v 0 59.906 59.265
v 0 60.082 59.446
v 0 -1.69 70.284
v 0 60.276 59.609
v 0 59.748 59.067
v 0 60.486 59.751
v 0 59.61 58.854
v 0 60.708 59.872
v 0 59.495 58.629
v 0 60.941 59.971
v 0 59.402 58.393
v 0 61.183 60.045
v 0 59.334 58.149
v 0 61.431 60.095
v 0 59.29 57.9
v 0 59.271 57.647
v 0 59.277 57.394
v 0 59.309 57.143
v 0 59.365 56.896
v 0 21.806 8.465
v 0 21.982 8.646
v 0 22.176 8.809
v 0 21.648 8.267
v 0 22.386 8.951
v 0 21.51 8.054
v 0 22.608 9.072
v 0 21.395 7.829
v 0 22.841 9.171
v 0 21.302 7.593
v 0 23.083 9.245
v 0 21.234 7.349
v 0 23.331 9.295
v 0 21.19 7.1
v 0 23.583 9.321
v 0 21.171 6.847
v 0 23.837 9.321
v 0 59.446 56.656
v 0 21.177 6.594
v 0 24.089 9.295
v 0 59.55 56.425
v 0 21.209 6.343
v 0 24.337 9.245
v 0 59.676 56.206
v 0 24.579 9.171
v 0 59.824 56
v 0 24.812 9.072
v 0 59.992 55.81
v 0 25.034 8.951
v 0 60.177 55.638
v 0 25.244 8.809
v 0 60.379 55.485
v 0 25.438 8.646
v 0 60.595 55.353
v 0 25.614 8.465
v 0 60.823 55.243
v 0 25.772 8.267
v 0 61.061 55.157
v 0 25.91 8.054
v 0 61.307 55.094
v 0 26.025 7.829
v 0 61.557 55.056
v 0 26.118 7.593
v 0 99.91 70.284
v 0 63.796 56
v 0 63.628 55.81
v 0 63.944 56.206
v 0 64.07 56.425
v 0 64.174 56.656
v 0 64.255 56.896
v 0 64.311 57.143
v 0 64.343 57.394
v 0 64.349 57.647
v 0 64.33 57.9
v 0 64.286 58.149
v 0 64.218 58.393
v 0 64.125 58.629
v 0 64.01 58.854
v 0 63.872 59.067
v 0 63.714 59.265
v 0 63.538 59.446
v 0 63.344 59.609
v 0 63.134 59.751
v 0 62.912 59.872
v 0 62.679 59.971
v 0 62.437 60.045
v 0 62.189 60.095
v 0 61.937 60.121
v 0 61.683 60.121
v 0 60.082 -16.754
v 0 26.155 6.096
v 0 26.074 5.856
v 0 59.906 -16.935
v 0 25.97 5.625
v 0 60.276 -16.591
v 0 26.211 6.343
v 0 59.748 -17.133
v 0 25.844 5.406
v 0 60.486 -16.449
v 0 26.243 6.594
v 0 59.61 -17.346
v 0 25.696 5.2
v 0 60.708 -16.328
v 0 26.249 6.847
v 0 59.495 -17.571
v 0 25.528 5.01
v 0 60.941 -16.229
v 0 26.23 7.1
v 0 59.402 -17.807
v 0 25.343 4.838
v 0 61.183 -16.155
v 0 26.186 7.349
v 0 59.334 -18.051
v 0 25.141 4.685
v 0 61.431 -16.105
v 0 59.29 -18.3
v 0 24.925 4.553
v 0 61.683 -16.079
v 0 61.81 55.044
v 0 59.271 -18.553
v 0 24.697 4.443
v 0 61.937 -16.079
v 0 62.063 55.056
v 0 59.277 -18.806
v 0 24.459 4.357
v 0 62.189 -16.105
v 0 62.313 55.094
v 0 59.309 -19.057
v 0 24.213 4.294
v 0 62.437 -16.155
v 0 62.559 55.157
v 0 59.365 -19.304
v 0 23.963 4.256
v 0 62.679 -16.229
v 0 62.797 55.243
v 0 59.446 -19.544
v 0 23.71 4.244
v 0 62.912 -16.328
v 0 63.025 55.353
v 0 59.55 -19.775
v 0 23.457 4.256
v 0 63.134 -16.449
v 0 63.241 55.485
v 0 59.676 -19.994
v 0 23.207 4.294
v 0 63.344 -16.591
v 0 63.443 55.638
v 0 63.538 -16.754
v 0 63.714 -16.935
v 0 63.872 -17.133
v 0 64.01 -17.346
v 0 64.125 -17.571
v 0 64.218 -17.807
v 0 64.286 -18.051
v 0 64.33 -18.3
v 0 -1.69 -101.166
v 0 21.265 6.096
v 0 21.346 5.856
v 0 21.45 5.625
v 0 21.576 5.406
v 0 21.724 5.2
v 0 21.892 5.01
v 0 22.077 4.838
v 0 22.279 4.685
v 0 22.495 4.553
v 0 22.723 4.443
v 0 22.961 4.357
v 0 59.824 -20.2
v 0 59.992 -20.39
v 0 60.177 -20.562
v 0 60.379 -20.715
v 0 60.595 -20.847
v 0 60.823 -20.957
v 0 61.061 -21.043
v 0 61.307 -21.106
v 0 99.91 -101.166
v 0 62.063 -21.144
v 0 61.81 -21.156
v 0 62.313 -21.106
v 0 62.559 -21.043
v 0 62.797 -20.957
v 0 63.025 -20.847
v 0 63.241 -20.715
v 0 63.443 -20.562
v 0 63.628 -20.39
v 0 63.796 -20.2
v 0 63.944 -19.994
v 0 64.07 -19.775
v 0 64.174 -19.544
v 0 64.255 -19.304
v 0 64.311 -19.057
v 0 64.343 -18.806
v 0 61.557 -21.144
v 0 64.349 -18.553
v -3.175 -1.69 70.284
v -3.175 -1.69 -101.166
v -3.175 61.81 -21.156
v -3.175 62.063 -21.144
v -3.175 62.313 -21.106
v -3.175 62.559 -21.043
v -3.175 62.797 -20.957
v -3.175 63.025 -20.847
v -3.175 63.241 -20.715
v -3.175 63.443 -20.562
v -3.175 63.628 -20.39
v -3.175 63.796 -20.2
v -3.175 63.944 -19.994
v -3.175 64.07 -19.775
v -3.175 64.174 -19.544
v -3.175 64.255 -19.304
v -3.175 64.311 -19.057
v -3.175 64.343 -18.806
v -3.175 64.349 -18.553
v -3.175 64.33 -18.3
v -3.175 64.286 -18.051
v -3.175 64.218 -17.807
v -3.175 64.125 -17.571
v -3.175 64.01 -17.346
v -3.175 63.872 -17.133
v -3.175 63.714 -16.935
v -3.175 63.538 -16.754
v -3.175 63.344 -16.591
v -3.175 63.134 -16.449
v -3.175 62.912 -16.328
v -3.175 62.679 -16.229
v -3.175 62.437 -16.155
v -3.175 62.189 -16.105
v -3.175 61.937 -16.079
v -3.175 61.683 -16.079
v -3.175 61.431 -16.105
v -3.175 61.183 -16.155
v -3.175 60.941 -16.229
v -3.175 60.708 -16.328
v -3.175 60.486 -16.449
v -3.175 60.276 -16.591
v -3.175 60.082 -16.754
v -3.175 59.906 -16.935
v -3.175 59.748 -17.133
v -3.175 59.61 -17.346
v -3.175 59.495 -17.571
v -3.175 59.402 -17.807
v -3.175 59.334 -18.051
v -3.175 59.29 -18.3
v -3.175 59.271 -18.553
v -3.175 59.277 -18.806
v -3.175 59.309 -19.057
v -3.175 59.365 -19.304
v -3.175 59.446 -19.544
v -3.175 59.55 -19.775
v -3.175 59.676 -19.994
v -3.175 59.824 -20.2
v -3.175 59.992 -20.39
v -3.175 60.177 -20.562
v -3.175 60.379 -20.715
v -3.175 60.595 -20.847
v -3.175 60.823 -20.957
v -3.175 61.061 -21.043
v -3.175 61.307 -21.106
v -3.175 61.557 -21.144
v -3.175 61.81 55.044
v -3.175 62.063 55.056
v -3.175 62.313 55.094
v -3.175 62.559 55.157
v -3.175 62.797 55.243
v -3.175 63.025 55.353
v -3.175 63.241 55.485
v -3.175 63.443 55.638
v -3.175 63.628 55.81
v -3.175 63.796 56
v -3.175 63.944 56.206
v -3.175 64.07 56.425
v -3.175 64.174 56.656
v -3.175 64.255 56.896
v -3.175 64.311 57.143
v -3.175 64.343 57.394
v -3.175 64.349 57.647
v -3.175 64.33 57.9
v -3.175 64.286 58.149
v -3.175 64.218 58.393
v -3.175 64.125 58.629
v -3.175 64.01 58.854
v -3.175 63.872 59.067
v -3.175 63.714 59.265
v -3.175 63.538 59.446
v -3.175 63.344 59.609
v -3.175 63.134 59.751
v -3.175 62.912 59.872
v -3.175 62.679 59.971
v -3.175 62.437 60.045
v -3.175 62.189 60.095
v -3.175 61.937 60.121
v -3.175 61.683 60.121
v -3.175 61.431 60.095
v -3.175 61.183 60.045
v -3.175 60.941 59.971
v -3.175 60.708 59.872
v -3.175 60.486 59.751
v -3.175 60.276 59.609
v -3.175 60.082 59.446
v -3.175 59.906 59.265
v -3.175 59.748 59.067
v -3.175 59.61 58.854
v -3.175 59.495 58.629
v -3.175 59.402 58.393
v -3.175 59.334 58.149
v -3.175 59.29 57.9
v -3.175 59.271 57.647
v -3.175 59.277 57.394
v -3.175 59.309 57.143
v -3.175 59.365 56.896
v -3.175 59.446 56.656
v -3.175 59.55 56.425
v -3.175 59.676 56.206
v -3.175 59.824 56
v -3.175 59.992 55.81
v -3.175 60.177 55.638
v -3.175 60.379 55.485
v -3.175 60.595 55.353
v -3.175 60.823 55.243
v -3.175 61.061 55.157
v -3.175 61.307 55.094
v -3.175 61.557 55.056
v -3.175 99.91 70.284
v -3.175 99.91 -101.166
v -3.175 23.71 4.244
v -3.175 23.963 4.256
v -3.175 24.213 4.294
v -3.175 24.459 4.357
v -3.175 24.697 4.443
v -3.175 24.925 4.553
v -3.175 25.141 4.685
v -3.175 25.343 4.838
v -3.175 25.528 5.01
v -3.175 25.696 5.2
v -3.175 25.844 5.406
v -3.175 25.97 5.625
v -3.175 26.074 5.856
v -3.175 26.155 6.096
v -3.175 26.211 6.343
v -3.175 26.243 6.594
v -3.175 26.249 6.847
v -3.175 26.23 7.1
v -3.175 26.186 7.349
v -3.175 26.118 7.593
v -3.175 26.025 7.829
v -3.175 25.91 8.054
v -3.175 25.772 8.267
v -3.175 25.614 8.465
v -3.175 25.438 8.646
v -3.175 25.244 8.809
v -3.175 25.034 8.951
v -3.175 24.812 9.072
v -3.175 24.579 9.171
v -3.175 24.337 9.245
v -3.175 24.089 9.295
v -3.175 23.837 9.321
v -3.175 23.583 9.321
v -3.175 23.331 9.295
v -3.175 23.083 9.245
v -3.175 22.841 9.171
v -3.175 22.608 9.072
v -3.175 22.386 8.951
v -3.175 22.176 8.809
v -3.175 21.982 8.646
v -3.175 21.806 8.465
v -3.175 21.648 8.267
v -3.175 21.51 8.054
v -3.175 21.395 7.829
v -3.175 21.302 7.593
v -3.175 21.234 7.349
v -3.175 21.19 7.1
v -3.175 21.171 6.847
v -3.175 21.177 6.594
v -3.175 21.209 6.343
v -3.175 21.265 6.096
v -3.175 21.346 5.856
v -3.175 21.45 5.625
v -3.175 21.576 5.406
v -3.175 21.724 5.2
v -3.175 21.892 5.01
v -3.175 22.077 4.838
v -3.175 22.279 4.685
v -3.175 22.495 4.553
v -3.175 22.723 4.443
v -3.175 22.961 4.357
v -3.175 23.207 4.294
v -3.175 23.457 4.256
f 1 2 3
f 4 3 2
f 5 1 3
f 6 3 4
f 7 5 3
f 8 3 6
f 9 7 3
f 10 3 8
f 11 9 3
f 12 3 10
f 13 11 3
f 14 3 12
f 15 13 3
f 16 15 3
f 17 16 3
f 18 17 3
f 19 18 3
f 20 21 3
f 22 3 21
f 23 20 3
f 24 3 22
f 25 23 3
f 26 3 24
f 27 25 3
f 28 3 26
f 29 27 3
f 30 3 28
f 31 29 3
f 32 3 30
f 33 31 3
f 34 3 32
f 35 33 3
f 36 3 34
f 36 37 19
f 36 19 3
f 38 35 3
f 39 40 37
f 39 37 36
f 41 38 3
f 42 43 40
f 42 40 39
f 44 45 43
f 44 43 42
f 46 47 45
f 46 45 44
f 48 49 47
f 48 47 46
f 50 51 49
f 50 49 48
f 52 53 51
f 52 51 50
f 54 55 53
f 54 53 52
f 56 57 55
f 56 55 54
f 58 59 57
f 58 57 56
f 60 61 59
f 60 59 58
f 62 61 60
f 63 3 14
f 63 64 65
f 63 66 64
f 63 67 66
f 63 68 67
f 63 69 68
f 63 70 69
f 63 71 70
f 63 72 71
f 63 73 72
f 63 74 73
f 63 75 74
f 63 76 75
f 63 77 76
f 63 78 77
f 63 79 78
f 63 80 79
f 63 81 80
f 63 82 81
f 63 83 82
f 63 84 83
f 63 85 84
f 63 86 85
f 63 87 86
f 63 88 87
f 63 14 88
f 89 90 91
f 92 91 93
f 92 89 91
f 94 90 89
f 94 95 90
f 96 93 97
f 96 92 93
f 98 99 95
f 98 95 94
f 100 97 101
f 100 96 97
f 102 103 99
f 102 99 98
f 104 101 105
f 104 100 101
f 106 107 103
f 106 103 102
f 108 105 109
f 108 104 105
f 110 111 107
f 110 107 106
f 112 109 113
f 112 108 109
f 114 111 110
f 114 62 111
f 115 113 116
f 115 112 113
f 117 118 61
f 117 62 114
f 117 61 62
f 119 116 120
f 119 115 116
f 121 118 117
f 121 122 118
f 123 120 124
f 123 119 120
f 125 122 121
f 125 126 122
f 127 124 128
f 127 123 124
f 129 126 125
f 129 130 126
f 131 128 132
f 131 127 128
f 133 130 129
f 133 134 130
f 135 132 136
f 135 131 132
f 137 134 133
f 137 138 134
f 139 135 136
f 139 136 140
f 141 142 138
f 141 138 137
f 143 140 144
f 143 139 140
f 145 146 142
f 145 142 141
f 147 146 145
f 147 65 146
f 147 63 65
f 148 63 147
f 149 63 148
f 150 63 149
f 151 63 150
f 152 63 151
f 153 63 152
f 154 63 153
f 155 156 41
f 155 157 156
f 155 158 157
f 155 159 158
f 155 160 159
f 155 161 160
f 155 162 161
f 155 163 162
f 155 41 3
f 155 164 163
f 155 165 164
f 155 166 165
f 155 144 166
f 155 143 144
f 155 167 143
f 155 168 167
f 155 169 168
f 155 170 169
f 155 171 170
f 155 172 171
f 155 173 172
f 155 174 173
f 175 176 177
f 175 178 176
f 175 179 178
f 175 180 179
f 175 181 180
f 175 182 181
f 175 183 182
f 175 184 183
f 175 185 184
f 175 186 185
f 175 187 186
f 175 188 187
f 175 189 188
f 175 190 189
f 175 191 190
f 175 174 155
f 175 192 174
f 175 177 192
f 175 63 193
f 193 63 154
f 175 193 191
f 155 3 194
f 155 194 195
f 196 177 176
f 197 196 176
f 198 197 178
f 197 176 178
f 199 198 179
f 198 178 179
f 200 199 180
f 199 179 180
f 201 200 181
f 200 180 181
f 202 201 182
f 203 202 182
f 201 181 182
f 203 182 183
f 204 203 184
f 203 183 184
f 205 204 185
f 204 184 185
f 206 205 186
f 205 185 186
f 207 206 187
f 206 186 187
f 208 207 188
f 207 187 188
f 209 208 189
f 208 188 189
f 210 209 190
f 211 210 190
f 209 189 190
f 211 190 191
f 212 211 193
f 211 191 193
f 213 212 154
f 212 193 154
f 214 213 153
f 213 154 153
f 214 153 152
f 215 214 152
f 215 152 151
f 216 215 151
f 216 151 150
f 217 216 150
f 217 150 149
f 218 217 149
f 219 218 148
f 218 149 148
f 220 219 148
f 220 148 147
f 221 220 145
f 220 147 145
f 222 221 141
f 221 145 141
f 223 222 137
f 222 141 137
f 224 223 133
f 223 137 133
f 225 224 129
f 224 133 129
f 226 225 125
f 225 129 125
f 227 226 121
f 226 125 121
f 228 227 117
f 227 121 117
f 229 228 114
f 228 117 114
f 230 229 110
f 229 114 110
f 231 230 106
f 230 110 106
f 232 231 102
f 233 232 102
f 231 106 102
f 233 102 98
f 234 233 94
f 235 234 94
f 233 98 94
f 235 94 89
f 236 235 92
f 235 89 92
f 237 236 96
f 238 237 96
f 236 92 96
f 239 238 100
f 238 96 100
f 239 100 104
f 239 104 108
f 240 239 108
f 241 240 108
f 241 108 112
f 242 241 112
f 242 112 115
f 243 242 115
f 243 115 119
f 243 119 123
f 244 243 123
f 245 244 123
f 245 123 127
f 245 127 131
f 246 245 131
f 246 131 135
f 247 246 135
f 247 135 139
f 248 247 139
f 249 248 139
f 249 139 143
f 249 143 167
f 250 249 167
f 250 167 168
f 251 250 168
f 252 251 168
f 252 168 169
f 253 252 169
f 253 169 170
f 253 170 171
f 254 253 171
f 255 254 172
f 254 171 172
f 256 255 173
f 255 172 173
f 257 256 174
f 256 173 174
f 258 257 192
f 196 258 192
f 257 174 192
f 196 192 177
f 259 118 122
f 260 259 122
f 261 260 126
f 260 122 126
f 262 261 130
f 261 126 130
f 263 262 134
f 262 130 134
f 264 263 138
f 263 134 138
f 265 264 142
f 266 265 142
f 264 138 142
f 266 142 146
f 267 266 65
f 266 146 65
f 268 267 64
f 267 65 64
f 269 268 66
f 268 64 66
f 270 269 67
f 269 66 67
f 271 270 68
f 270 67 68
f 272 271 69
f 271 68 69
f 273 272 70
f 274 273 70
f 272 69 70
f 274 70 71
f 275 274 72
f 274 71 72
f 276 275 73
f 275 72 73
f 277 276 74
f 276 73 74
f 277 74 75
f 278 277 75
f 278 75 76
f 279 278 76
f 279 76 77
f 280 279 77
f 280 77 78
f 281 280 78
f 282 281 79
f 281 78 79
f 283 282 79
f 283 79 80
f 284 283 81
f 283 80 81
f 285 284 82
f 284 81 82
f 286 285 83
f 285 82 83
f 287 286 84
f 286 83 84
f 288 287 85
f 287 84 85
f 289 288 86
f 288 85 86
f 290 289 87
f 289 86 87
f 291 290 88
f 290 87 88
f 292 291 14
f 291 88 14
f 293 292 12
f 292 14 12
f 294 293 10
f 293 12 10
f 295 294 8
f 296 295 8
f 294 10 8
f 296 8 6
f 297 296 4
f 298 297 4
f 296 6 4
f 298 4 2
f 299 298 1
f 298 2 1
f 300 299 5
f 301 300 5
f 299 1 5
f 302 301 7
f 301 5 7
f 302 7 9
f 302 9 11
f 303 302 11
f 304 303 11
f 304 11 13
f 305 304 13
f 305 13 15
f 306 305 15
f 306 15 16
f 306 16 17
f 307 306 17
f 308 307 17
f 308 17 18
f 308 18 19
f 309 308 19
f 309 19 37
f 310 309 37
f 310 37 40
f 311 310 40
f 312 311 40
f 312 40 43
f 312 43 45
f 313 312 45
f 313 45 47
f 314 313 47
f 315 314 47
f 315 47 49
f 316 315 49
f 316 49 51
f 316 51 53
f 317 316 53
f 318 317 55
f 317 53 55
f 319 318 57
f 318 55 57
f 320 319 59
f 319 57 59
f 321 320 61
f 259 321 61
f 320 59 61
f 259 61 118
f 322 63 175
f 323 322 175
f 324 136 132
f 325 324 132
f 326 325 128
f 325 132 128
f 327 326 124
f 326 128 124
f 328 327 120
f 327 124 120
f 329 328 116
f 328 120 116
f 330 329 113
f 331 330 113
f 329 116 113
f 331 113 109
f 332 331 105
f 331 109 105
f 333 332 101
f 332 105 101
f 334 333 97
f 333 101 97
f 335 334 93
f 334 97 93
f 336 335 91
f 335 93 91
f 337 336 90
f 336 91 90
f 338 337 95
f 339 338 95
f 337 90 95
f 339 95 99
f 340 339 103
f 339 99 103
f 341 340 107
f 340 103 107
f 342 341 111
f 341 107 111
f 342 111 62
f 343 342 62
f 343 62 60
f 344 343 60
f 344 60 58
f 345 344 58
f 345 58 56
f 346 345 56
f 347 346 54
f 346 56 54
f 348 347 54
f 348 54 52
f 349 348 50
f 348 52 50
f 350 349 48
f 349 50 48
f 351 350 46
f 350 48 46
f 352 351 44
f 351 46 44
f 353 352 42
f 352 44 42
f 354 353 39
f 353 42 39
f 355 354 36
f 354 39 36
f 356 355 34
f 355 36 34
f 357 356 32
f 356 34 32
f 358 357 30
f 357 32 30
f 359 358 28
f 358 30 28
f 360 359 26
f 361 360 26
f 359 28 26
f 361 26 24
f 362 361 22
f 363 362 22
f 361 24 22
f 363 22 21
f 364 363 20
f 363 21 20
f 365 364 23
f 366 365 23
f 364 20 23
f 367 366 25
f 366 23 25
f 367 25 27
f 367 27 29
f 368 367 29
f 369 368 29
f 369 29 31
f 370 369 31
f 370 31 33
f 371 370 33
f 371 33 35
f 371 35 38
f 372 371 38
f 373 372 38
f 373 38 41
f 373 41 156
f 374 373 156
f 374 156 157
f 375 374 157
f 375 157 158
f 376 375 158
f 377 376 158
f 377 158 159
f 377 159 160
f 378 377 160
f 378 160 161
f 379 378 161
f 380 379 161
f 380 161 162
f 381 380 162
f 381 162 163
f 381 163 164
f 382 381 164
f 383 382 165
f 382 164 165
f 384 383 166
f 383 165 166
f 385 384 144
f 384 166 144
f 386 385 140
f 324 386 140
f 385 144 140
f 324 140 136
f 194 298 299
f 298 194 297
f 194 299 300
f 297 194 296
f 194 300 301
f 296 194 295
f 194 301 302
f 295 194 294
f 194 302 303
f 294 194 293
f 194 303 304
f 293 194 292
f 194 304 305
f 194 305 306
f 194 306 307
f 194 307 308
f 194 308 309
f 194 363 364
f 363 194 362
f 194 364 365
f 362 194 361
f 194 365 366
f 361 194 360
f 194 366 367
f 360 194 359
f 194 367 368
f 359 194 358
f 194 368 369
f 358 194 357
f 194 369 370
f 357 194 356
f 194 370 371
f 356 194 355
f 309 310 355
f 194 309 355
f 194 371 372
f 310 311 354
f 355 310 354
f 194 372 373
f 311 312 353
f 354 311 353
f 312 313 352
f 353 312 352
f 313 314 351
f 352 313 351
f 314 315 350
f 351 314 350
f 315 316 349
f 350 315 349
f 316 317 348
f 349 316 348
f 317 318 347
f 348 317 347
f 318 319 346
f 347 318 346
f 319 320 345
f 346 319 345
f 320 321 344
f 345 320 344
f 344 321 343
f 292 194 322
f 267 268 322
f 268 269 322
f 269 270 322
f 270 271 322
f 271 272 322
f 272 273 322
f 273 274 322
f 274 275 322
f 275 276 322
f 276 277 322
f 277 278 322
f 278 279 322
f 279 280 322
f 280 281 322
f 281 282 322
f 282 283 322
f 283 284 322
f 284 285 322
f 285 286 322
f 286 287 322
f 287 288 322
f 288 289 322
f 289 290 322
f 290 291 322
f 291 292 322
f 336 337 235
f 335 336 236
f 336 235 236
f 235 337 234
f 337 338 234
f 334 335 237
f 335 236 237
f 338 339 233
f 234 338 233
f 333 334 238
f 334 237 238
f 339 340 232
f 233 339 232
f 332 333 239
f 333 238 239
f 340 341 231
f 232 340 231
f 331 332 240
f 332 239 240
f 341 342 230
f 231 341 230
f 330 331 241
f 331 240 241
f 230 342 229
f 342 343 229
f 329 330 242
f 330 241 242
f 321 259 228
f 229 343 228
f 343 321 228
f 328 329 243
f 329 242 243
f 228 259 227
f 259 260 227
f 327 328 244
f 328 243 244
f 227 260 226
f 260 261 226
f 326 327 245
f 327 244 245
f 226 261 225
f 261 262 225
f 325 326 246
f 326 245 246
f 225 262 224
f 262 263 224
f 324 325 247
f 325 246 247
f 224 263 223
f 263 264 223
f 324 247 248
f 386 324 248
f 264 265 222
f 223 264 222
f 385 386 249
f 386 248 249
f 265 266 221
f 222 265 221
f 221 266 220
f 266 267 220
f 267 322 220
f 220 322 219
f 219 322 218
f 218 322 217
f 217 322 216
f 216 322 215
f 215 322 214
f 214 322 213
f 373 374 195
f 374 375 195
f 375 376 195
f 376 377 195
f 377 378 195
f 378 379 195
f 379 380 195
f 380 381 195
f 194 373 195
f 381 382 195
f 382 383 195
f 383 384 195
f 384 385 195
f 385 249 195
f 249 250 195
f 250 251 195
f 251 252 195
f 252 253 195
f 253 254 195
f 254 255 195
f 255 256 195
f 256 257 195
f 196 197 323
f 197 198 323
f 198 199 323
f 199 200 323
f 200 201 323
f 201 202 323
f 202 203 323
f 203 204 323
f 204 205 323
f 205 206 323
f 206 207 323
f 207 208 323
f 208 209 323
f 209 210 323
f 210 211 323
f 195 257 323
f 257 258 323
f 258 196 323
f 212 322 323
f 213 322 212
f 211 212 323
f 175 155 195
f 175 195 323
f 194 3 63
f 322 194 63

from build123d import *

# Parameters (mm, degrees)
SKETCH1_W           = 171.45
SKETCH1_H           = 101.6
SKETCH1_R           = 2.54
BOSS_EXTRUDE1_DEPTH = 3.175


with BuildPart() as part:
    # Sketch1 → Boss-Extrude1 (new body)
    with BuildSketch(Plane(origin=(0, 0, 0), x_dir=(0, 0, -1), z_dir=(1, 0, 0))):
        with Locations((15.441164676, 49.109973191)):
            Rectangle(SKETCH1_W, SKETCH1_H)
        with Locations((-57.583835324, 61.809973191)):
            Circle(SKETCH1_R, mode=Mode.SUBTRACT)
        with Locations((18.616164676, 61.809973191)):
            Circle(SKETCH1_R, mode=Mode.SUBTRACT)
        with Locations((-6.783835324, 23.709973191)):
            Circle(SKETCH1_R, mode=Mode.SUBTRACT)
    extrude(amount=-BOSS_EXTRUDE1_DEPTH)


solid = part.part
